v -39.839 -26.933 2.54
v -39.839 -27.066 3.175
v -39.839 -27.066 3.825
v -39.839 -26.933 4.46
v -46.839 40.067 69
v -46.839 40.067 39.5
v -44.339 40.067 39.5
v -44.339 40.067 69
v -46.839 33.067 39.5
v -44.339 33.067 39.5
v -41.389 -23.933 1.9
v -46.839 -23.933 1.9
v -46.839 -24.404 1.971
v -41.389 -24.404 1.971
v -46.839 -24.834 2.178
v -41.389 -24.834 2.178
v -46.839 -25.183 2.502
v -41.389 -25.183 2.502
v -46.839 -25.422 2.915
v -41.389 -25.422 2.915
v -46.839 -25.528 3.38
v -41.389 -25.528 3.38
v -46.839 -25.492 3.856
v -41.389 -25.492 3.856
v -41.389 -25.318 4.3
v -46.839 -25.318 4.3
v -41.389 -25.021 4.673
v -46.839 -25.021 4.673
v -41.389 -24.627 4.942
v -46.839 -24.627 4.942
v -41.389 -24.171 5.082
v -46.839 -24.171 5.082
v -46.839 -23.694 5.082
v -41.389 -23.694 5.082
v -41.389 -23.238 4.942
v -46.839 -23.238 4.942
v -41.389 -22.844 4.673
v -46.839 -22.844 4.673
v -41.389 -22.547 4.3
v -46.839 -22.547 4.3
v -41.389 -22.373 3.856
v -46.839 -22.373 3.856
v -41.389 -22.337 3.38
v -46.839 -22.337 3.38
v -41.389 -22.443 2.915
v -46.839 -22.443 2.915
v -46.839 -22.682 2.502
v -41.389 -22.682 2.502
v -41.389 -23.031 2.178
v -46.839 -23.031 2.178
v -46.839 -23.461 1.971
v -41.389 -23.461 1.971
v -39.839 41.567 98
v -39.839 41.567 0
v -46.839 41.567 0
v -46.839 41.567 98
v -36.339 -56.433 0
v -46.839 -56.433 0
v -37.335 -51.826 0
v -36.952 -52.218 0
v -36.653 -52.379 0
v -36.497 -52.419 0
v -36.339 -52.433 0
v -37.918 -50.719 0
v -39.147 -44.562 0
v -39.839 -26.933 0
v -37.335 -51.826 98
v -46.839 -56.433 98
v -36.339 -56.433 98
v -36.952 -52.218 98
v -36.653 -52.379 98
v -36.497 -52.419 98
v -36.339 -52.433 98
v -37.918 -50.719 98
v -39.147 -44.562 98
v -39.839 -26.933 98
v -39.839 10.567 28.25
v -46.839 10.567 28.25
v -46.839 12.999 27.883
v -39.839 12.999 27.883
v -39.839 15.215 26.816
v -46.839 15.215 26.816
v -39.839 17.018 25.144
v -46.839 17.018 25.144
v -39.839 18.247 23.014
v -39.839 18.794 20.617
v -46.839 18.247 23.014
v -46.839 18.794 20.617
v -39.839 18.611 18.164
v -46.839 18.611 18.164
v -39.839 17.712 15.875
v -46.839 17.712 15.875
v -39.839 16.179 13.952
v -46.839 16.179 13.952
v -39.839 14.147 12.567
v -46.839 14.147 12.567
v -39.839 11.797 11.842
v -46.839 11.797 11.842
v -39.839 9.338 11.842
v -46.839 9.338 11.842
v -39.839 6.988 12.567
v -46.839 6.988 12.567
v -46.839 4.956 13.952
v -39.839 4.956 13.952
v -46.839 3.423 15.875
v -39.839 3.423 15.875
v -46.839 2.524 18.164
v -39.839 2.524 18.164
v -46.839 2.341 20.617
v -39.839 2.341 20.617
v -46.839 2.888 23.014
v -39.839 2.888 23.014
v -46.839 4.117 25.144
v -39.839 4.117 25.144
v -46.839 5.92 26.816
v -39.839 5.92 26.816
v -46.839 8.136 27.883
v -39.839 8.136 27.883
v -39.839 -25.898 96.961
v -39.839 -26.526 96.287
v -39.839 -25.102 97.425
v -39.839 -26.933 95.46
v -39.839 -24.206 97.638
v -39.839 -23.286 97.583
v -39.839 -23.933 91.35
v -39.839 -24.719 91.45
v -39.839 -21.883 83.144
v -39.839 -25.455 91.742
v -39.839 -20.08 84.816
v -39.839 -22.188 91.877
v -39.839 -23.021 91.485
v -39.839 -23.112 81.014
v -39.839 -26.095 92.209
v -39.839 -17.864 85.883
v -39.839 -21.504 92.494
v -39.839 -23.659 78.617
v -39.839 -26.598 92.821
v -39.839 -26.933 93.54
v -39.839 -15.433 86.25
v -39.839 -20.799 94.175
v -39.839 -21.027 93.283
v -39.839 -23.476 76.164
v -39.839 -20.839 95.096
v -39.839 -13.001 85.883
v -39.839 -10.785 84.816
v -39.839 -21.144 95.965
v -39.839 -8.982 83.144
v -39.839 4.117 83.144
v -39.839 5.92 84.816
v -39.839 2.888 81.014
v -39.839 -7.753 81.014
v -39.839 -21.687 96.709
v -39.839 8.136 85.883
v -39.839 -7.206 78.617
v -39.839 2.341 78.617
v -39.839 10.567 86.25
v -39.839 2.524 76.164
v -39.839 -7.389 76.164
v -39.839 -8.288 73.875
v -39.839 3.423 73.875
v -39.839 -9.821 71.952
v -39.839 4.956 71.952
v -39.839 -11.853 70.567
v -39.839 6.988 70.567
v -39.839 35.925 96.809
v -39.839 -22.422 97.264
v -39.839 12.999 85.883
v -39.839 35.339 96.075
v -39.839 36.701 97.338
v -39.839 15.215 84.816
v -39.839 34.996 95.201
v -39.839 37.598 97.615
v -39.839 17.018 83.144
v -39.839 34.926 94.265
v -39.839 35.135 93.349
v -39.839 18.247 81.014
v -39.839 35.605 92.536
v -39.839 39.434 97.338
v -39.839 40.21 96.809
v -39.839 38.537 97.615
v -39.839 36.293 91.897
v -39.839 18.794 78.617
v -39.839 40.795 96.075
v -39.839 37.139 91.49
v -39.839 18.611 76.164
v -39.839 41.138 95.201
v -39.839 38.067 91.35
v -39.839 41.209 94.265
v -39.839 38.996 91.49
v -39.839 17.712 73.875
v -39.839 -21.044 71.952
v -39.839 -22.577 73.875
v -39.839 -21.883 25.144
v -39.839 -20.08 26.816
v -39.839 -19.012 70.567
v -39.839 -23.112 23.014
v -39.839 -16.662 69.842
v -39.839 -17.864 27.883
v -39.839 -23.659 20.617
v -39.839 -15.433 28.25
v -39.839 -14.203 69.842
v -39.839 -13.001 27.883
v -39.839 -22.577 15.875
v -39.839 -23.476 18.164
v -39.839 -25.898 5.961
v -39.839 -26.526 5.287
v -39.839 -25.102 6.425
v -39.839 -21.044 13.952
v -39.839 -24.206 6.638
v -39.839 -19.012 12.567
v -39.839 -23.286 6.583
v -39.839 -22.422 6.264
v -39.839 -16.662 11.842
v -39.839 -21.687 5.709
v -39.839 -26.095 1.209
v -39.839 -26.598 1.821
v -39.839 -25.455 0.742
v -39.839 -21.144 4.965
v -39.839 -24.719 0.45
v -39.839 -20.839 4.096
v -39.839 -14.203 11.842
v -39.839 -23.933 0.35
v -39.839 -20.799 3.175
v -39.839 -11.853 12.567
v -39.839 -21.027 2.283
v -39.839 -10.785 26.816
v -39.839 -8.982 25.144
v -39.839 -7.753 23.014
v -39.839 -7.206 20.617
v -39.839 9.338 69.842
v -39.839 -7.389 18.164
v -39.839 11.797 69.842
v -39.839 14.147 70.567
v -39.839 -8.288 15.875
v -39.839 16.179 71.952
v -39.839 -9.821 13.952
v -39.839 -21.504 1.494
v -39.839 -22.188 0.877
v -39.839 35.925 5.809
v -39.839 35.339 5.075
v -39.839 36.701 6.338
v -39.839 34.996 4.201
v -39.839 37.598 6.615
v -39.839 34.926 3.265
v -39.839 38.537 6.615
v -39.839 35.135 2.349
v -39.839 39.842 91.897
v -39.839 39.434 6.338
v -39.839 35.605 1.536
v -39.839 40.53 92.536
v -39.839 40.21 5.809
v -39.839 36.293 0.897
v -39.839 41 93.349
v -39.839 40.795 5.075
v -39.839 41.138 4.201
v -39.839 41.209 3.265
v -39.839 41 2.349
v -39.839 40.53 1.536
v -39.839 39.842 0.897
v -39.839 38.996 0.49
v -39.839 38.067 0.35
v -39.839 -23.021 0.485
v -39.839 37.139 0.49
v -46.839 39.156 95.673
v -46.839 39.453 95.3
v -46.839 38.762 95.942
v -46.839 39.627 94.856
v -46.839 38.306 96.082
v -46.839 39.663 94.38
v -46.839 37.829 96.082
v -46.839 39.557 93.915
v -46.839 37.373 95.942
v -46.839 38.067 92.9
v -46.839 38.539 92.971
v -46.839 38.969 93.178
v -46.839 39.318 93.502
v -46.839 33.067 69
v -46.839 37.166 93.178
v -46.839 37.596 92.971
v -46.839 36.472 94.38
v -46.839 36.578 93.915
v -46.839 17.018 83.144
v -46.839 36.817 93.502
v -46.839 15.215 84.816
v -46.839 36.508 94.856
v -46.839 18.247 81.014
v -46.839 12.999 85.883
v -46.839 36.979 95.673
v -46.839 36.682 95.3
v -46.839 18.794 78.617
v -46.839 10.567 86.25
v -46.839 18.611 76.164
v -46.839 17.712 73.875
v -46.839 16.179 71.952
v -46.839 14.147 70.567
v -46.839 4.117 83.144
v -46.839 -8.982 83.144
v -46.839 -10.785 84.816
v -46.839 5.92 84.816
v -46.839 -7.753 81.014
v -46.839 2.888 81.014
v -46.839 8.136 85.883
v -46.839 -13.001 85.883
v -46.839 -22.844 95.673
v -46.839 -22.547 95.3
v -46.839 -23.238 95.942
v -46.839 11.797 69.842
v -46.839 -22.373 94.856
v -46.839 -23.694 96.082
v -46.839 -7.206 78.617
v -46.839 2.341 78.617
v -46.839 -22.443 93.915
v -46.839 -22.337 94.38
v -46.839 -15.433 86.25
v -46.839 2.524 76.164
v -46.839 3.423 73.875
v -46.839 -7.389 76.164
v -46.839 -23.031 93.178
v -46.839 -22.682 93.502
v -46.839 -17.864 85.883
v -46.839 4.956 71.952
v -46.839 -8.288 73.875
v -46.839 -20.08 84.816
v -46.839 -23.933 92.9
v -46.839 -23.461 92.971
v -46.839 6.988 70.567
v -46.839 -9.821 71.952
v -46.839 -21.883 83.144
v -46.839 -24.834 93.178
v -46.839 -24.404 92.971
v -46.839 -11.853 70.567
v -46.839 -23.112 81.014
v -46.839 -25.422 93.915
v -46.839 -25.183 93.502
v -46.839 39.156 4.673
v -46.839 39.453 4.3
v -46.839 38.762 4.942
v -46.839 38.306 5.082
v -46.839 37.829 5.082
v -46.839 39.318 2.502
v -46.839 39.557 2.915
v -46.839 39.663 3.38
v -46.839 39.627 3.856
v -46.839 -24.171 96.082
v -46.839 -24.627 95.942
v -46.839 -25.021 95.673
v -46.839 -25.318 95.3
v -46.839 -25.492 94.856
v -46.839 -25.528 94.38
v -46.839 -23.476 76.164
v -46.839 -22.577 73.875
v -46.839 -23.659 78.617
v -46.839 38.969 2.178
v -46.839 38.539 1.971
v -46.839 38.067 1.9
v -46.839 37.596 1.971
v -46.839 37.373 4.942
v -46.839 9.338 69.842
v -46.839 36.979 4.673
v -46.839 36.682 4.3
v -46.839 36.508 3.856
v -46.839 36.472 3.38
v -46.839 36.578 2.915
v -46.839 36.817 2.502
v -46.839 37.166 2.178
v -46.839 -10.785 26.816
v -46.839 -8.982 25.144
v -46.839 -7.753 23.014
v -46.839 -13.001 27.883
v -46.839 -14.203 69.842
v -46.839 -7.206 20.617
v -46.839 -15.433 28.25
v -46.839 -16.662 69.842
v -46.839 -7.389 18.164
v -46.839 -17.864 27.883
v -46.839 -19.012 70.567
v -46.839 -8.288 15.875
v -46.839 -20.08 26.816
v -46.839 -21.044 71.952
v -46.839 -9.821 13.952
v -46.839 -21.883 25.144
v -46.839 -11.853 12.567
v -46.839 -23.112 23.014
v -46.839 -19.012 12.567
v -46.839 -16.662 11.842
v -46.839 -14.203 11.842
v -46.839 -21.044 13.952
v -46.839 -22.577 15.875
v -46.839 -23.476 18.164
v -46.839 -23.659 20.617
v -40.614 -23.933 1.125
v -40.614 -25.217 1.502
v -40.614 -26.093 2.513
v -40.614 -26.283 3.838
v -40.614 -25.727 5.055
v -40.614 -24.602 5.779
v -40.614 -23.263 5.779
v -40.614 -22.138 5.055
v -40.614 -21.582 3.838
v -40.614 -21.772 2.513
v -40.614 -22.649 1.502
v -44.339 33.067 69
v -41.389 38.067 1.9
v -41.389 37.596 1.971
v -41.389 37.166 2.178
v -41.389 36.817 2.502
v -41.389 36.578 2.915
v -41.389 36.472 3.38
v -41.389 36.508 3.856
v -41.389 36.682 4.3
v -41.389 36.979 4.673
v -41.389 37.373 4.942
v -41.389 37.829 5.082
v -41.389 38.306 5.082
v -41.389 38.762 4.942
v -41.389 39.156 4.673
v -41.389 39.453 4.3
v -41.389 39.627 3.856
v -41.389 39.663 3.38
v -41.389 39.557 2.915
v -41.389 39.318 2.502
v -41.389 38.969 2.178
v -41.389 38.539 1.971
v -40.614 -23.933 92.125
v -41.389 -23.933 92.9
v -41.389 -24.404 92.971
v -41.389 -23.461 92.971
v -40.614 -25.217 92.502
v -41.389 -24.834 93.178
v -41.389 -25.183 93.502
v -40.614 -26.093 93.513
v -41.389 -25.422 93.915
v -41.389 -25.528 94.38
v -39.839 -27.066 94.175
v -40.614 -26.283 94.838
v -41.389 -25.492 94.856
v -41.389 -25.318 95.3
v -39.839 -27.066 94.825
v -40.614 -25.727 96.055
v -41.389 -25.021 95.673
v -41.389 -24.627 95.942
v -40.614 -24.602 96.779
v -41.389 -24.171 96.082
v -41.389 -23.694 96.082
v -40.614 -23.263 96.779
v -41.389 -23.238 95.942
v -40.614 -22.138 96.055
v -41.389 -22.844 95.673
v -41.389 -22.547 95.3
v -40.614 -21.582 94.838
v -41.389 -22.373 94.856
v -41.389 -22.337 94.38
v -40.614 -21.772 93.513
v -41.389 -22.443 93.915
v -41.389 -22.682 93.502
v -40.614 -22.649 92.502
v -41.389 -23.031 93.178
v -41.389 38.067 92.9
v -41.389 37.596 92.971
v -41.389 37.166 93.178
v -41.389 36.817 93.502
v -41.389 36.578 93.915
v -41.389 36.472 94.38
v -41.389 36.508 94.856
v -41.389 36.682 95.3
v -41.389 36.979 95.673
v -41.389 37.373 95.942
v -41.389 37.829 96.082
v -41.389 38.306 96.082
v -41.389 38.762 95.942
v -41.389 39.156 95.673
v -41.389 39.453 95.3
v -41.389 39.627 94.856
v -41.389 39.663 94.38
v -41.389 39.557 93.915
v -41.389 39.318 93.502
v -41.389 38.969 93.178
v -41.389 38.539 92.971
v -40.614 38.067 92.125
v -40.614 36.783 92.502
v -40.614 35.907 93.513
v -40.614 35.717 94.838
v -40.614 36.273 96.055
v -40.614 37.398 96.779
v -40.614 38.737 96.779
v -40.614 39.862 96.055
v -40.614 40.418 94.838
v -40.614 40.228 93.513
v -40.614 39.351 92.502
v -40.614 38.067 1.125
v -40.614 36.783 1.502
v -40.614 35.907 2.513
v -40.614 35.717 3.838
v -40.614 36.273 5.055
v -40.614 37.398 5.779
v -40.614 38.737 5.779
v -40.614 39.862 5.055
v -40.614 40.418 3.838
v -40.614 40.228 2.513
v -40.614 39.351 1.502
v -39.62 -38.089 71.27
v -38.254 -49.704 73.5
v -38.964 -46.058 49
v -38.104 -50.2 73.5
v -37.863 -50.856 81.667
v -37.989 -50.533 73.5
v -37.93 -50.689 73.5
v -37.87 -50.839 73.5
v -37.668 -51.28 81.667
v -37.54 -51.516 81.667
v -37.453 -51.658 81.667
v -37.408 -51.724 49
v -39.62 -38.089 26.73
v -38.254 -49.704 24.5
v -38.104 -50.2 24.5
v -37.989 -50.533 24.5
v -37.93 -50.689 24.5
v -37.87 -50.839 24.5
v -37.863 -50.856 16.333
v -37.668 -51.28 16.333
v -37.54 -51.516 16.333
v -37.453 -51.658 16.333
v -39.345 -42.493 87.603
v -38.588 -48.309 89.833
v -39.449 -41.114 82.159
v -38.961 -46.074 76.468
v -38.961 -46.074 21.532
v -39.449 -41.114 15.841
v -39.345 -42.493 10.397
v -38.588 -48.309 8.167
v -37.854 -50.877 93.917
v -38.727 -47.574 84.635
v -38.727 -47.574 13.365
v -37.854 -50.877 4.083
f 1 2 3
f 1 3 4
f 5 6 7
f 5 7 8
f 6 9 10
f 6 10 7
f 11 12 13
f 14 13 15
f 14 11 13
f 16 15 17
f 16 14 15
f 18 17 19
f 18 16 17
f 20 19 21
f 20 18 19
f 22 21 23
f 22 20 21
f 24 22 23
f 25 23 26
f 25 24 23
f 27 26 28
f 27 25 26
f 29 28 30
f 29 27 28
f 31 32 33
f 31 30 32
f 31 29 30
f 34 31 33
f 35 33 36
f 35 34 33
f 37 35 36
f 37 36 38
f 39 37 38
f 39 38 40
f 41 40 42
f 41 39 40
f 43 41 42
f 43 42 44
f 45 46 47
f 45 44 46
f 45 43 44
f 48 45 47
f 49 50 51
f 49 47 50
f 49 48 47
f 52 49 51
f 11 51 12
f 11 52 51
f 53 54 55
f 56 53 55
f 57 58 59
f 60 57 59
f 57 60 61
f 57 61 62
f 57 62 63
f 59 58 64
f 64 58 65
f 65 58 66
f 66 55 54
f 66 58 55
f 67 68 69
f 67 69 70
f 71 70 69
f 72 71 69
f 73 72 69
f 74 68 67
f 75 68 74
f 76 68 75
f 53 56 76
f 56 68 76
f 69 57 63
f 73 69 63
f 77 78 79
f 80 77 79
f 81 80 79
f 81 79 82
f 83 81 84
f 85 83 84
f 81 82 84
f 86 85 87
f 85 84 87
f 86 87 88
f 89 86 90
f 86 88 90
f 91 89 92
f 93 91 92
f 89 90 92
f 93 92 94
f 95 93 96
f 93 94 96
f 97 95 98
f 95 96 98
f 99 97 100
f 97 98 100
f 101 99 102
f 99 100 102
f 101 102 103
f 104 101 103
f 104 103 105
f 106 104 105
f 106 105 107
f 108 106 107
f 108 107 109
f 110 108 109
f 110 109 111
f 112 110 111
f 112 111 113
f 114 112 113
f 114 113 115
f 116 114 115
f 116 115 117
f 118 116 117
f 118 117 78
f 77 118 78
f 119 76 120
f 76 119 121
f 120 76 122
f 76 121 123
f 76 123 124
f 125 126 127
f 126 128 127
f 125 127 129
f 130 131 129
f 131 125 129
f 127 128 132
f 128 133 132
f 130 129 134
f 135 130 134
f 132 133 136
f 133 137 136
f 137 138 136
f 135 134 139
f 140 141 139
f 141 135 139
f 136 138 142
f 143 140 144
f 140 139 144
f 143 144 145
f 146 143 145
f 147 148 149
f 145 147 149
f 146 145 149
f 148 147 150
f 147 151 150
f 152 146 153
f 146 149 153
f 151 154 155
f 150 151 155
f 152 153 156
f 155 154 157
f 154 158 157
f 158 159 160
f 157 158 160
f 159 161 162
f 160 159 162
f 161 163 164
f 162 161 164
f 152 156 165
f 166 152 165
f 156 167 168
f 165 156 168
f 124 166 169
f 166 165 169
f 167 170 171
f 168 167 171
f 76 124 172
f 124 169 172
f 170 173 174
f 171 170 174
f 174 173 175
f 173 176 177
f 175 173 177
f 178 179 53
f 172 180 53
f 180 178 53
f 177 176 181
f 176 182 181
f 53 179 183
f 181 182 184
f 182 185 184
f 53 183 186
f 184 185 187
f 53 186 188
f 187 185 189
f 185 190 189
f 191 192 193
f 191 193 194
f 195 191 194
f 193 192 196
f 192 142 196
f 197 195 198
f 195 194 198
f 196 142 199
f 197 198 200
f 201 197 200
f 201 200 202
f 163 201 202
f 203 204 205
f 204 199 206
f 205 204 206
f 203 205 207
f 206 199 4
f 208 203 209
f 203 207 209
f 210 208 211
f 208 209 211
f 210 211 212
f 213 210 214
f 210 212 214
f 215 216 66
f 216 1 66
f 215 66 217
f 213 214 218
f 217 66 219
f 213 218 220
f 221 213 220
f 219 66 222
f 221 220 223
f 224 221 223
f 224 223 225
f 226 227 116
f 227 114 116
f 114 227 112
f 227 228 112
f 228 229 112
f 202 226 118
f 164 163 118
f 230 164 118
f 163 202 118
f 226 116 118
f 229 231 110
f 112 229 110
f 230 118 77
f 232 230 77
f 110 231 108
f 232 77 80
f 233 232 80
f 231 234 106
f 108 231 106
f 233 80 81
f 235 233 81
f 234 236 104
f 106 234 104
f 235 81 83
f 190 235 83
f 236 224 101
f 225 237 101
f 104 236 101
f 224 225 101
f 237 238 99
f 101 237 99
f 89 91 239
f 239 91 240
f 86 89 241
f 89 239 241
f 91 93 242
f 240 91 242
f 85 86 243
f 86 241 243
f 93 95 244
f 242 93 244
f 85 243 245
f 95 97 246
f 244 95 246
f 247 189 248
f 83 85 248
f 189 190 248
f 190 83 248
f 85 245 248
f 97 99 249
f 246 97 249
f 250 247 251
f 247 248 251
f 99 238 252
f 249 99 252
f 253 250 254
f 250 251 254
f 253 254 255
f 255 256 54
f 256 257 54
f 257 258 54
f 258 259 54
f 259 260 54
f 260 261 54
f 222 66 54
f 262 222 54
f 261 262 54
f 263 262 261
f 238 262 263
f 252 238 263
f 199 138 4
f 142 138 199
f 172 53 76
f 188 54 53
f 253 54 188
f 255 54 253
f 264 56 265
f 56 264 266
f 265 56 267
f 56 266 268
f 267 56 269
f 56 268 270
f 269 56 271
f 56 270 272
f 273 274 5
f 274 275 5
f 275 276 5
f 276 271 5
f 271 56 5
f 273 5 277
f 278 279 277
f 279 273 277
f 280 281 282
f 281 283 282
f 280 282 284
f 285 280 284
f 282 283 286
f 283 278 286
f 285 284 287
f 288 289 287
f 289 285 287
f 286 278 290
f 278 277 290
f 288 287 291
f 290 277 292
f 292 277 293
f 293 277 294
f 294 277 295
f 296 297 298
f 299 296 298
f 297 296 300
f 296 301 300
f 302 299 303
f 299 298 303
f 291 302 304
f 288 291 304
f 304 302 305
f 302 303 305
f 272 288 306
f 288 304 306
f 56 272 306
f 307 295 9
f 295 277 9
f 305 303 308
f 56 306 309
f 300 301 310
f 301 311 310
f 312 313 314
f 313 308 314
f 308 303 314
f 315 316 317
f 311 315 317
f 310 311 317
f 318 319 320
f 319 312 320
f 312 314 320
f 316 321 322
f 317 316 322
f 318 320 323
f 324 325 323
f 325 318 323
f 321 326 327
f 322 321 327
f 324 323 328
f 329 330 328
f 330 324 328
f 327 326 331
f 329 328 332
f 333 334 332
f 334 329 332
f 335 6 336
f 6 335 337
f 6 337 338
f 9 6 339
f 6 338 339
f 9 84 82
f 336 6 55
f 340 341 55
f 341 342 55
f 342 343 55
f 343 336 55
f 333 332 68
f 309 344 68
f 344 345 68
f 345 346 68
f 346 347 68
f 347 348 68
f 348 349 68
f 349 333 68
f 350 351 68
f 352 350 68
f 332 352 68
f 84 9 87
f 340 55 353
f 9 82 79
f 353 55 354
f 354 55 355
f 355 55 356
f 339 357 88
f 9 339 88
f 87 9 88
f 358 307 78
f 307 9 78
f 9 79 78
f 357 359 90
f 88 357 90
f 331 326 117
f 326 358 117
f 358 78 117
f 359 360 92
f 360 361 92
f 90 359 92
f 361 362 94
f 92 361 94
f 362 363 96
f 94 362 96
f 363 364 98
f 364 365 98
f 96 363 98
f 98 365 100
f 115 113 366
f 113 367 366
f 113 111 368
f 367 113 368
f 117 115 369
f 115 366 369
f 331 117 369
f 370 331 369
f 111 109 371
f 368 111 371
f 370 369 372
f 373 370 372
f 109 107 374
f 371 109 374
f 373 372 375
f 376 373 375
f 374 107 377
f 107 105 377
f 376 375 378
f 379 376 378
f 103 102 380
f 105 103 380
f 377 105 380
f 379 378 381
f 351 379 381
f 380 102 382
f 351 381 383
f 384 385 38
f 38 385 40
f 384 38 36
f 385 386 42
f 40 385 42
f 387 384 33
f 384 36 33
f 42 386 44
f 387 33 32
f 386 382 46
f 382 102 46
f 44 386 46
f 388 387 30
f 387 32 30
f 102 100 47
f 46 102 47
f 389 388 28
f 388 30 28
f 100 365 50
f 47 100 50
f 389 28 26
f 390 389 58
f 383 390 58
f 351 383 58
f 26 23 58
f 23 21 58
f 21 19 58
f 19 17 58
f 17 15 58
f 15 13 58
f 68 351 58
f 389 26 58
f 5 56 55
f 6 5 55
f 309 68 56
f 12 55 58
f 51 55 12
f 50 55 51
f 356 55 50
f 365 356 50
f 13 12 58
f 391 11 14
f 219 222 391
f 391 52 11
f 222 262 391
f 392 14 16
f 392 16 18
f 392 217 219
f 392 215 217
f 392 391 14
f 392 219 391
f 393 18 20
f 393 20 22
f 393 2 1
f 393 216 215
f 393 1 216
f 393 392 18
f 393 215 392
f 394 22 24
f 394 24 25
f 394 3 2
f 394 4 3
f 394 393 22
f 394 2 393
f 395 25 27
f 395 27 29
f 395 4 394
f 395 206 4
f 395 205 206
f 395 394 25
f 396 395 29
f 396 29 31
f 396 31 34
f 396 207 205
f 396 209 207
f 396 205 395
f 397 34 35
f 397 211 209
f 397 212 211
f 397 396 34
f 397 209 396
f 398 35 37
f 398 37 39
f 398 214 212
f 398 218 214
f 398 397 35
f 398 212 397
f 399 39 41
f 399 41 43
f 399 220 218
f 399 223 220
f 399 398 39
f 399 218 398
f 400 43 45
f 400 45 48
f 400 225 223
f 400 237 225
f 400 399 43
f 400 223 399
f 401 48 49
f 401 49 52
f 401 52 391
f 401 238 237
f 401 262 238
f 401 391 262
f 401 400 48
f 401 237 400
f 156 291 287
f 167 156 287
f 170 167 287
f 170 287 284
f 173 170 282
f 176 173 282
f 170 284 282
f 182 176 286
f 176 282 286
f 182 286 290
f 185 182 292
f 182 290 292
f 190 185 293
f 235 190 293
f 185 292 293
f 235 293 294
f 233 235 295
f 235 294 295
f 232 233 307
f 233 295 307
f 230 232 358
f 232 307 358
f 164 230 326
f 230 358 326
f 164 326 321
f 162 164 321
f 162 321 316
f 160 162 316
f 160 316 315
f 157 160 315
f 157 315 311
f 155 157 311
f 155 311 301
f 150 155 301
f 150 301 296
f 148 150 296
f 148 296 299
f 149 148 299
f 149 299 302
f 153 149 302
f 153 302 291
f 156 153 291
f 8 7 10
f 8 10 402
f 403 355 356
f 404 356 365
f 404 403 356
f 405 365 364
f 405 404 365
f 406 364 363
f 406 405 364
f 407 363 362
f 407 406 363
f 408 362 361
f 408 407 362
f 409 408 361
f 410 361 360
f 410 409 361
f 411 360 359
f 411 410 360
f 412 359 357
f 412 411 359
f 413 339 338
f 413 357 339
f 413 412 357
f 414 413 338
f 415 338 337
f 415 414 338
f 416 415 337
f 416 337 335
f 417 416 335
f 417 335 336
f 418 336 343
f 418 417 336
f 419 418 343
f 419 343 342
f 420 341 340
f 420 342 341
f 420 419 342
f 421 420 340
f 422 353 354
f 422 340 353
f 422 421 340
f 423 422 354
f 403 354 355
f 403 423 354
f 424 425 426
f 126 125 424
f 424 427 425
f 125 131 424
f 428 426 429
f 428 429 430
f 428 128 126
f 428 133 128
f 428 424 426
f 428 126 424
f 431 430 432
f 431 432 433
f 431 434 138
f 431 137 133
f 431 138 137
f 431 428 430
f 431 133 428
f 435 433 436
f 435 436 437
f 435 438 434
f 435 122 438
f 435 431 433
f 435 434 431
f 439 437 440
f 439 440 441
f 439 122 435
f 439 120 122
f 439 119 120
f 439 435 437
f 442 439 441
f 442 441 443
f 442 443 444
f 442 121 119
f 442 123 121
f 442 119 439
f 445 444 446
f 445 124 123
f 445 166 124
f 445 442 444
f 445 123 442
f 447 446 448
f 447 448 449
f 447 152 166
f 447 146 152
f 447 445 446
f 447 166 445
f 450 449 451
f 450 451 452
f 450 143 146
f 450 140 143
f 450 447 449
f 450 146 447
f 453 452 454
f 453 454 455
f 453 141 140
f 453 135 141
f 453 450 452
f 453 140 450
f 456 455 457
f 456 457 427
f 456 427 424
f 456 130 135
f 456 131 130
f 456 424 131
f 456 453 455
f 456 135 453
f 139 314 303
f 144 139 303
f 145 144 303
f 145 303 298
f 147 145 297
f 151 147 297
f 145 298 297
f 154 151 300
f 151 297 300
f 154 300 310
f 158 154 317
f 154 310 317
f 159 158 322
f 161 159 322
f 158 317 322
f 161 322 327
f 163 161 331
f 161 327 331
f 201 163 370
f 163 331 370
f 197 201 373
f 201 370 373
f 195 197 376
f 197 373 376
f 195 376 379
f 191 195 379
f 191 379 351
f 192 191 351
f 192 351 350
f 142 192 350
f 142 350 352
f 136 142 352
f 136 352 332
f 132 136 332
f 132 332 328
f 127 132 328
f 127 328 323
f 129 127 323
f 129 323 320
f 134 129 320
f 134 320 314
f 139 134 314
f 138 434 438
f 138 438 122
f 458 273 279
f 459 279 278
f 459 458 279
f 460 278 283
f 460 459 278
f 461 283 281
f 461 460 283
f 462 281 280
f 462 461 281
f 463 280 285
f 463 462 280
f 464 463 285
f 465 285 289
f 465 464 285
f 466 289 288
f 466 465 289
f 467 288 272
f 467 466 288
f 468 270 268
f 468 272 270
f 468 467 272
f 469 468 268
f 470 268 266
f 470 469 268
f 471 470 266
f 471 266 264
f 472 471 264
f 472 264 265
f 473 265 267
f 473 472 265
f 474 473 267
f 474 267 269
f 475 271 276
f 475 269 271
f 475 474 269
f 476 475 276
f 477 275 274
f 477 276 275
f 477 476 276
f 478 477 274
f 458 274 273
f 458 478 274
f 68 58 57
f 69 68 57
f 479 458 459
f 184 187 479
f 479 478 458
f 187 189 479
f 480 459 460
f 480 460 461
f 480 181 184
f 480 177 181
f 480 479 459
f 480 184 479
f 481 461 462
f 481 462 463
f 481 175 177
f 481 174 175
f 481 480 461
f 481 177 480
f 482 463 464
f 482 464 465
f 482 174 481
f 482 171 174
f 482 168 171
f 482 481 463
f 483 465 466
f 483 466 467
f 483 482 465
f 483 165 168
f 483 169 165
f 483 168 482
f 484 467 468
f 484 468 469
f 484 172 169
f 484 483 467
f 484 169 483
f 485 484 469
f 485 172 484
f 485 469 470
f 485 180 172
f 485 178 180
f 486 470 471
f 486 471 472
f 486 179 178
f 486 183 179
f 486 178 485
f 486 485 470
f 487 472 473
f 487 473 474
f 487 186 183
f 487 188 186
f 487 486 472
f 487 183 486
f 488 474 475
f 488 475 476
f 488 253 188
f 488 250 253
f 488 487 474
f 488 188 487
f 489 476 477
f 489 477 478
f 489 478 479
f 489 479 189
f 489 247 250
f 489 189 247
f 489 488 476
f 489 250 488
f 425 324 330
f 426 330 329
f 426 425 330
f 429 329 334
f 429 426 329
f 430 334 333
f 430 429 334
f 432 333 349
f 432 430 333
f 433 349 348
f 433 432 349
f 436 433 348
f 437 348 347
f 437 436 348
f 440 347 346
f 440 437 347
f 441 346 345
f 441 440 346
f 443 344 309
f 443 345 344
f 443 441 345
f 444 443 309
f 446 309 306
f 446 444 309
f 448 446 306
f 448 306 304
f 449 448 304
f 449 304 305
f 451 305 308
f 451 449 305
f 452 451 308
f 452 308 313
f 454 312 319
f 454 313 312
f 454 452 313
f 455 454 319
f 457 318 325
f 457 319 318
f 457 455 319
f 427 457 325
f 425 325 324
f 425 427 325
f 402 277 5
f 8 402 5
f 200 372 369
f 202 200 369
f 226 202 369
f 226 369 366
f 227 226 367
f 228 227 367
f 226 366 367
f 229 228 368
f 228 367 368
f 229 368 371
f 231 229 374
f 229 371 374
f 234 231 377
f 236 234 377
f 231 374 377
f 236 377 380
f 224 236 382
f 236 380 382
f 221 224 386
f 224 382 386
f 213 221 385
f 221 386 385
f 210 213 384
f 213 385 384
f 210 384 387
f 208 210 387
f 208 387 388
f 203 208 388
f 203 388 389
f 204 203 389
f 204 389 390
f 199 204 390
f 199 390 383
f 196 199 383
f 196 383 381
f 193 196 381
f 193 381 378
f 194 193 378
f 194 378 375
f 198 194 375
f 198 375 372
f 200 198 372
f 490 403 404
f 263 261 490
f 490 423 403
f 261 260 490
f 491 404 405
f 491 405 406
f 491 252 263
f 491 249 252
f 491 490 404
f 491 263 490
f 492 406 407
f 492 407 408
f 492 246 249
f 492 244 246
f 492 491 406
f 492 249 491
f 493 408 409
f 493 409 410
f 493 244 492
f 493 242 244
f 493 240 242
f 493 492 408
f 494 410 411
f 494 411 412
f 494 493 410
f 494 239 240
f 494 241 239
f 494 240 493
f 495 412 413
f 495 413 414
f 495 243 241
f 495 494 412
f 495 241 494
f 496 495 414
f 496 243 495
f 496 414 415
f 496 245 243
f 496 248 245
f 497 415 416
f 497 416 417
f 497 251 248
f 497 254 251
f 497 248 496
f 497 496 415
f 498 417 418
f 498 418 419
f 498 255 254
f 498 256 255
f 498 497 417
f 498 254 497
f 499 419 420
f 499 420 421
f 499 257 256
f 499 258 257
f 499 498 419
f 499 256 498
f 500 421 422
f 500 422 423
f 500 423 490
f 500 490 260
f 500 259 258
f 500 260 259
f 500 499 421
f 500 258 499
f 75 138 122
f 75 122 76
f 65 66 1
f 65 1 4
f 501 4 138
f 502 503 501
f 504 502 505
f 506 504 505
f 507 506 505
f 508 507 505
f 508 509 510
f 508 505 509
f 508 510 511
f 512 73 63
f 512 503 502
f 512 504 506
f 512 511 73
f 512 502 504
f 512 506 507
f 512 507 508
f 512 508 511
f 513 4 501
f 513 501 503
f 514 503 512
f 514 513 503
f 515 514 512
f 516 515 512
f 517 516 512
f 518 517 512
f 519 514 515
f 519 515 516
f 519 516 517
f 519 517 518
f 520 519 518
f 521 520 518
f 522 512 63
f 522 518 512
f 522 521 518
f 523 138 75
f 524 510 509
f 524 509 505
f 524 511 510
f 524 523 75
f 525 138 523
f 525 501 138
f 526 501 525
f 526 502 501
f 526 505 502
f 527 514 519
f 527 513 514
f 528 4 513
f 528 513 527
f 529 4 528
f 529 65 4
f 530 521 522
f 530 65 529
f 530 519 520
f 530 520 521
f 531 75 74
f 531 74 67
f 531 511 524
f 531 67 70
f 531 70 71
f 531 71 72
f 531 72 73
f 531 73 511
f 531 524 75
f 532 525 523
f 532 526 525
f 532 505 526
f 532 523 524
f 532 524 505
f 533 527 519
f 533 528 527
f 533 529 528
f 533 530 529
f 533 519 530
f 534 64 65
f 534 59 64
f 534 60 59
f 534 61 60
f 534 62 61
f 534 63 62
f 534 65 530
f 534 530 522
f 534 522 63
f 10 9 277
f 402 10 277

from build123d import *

# Parameters (mm, degrees)
BOSS_EXTRUDE1_DEPTH                            = 98
SKETCH2_R                                      = 8.25
CUT_EXTRUDE1_DEPTH                             = 114.573245575
CSK_FOR_M3_FLAT_HEAD_MACHINE_SCREW2_AT_2_COUNT = 2
CSK_FOR_M3_FLAT_HEAD_MACHINE_SCREW2_AT_2_PITCH = 62
CSK_FOR_M3_FLAT_HEAD_MACHINE_SCREW2_AT_3_COUNT = 2
CSK_FOR_M3_FLAT_HEAD_MACHINE_SCREW2_AT_3_PITCH = 110.113577728
CSK_FOR_M3_FLAT_HEAD_MACHINE_SCREW2_AT_4_COUNT = 2
CSK_FOR_M3_FLAT_HEAD_MACHINE_SCREW2_AT_4_PITCH = 91
SKETCH9_W                                      = 29.5
SKETCH9_H                                      = 7
CUT_EXTRUDE2_DEPTH                             = 2.5


with BuildPart() as part:
    # Sketch1 → Boss-Extrude1 (new body)
    with BuildSketch(Plane.XY):
        with BuildLine():
            Line((-46.838690812, 41.567455511), (-46.838690812, -56.432544489))
            Line((-46.838690812, -56.432544489), (-36.338690812, -56.432544489))
            Line((-36.338690812, -56.432544489), (-36.338690812, -52.432544489))
            add(Edge.make_bspline(
                [(-39.838690812, -26.932544489), (-39.838690812, -52.432544489), (-36.338690812, -52.432544489)],
                knots=[0, 0, 0, 1, 1, 1], degree=2))
            Line((-39.838690812, -26.932544489), (-39.838690812, 41.567455511))
            Line((-39.838690812, 41.567455511), (-46.838690812, 41.567455511))
        make_face()
    extrude(amount=BOSS_EXTRUDE1_DEPTH)

    # Sketch2 → Cut-Extrude1 (cut, through all)
    with BuildSketch(Plane.ZY.offset(46.838690812)):
        with Locations((20, 10.567455511)):
            Circle(SKETCH2_R)
        with Locations((78, 10.567455511)):
            Circle(SKETCH2_R)
        with Locations((78, -15.432544489)):
            Circle(SKETCH2_R)
        with Locations((20, -15.432544489)):
            Circle(SKETCH2_R)
    extrude(amount=-CUT_EXTRUDE1_DEPTH, mode=Mode.SUBTRACT)

    # Sketch8 → CSK for M3 Flat Head Machine Screw2 (revolve, cut)
    with BuildSketch(Plane(origin=(-39.838690812, 38.067455511, 94.5), x_dir=(0, 0, -1), z_dir=(0, 1, 0))):
        Polygon((0, 0), (0, 10.96137699), (1.6, 10), (1.6, 1.55), (3.15, 0), align=None)
    csk_for_m3_flat_head_machine_screw2 = revolve(axis=Axis((-33.488690812, 38.067455511, 94.5), (-1, 0, 0)), mode=Mode.SUBTRACT)

    # CSK for M3 Flat Head Machine Screw2 at 2: CSK for M3 Flat Head Machine Screw2 ×2
    with Locations(*[(0, -i * CSK_FOR_M3_FLAT_HEAD_MACHINE_SCREW2_AT_2_PITCH, 0) for i in range(1, CSK_FOR_M3_FLAT_HEAD_MACHINE_SCREW2_AT_2_COUNT)]):
        add(csk_for_m3_flat_head_machine_screw2, mode=Mode.SUBTRACT)

    # CSK for M3 Flat Head Machine Screw2 at 3: CSK for M3 Flat Head Machine Screw2 ×2
    with Locations(*[Vector(0, -0.5630549953912599, -0.8264194287194296) * (i * CSK_FOR_M3_FLAT_HEAD_MACHINE_SCREW2_AT_3_PITCH) for i in range(1, CSK_FOR_M3_FLAT_HEAD_MACHINE_SCREW2_AT_3_COUNT)]):
        add(csk_for_m3_flat_head_machine_screw2, mode=Mode.SUBTRACT)

    # CSK for M3 Flat Head Machine Screw2 at 4: CSK for M3 Flat Head Machine Screw2 ×2
    with Locations(*[(0, 0, -i * CSK_FOR_M3_FLAT_HEAD_MACHINE_SCREW2_AT_4_PITCH) for i in range(1, CSK_FOR_M3_FLAT_HEAD_MACHINE_SCREW2_AT_4_COUNT)]):
        add(csk_for_m3_flat_head_machine_screw2, mode=Mode.SUBTRACT)

    # Sketch9 → Cut-Extrude2 (cut)
    with BuildSketch(Plane.ZY.offset(46.838690812)):
        with Locations((54.25, 36.567455511)):
            Rectangle(SKETCH9_W, SKETCH9_H)
    extrude(amount=-CUT_EXTRUDE2_DEPTH, mode=Mode.SUBTRACT)


solid = part.part
